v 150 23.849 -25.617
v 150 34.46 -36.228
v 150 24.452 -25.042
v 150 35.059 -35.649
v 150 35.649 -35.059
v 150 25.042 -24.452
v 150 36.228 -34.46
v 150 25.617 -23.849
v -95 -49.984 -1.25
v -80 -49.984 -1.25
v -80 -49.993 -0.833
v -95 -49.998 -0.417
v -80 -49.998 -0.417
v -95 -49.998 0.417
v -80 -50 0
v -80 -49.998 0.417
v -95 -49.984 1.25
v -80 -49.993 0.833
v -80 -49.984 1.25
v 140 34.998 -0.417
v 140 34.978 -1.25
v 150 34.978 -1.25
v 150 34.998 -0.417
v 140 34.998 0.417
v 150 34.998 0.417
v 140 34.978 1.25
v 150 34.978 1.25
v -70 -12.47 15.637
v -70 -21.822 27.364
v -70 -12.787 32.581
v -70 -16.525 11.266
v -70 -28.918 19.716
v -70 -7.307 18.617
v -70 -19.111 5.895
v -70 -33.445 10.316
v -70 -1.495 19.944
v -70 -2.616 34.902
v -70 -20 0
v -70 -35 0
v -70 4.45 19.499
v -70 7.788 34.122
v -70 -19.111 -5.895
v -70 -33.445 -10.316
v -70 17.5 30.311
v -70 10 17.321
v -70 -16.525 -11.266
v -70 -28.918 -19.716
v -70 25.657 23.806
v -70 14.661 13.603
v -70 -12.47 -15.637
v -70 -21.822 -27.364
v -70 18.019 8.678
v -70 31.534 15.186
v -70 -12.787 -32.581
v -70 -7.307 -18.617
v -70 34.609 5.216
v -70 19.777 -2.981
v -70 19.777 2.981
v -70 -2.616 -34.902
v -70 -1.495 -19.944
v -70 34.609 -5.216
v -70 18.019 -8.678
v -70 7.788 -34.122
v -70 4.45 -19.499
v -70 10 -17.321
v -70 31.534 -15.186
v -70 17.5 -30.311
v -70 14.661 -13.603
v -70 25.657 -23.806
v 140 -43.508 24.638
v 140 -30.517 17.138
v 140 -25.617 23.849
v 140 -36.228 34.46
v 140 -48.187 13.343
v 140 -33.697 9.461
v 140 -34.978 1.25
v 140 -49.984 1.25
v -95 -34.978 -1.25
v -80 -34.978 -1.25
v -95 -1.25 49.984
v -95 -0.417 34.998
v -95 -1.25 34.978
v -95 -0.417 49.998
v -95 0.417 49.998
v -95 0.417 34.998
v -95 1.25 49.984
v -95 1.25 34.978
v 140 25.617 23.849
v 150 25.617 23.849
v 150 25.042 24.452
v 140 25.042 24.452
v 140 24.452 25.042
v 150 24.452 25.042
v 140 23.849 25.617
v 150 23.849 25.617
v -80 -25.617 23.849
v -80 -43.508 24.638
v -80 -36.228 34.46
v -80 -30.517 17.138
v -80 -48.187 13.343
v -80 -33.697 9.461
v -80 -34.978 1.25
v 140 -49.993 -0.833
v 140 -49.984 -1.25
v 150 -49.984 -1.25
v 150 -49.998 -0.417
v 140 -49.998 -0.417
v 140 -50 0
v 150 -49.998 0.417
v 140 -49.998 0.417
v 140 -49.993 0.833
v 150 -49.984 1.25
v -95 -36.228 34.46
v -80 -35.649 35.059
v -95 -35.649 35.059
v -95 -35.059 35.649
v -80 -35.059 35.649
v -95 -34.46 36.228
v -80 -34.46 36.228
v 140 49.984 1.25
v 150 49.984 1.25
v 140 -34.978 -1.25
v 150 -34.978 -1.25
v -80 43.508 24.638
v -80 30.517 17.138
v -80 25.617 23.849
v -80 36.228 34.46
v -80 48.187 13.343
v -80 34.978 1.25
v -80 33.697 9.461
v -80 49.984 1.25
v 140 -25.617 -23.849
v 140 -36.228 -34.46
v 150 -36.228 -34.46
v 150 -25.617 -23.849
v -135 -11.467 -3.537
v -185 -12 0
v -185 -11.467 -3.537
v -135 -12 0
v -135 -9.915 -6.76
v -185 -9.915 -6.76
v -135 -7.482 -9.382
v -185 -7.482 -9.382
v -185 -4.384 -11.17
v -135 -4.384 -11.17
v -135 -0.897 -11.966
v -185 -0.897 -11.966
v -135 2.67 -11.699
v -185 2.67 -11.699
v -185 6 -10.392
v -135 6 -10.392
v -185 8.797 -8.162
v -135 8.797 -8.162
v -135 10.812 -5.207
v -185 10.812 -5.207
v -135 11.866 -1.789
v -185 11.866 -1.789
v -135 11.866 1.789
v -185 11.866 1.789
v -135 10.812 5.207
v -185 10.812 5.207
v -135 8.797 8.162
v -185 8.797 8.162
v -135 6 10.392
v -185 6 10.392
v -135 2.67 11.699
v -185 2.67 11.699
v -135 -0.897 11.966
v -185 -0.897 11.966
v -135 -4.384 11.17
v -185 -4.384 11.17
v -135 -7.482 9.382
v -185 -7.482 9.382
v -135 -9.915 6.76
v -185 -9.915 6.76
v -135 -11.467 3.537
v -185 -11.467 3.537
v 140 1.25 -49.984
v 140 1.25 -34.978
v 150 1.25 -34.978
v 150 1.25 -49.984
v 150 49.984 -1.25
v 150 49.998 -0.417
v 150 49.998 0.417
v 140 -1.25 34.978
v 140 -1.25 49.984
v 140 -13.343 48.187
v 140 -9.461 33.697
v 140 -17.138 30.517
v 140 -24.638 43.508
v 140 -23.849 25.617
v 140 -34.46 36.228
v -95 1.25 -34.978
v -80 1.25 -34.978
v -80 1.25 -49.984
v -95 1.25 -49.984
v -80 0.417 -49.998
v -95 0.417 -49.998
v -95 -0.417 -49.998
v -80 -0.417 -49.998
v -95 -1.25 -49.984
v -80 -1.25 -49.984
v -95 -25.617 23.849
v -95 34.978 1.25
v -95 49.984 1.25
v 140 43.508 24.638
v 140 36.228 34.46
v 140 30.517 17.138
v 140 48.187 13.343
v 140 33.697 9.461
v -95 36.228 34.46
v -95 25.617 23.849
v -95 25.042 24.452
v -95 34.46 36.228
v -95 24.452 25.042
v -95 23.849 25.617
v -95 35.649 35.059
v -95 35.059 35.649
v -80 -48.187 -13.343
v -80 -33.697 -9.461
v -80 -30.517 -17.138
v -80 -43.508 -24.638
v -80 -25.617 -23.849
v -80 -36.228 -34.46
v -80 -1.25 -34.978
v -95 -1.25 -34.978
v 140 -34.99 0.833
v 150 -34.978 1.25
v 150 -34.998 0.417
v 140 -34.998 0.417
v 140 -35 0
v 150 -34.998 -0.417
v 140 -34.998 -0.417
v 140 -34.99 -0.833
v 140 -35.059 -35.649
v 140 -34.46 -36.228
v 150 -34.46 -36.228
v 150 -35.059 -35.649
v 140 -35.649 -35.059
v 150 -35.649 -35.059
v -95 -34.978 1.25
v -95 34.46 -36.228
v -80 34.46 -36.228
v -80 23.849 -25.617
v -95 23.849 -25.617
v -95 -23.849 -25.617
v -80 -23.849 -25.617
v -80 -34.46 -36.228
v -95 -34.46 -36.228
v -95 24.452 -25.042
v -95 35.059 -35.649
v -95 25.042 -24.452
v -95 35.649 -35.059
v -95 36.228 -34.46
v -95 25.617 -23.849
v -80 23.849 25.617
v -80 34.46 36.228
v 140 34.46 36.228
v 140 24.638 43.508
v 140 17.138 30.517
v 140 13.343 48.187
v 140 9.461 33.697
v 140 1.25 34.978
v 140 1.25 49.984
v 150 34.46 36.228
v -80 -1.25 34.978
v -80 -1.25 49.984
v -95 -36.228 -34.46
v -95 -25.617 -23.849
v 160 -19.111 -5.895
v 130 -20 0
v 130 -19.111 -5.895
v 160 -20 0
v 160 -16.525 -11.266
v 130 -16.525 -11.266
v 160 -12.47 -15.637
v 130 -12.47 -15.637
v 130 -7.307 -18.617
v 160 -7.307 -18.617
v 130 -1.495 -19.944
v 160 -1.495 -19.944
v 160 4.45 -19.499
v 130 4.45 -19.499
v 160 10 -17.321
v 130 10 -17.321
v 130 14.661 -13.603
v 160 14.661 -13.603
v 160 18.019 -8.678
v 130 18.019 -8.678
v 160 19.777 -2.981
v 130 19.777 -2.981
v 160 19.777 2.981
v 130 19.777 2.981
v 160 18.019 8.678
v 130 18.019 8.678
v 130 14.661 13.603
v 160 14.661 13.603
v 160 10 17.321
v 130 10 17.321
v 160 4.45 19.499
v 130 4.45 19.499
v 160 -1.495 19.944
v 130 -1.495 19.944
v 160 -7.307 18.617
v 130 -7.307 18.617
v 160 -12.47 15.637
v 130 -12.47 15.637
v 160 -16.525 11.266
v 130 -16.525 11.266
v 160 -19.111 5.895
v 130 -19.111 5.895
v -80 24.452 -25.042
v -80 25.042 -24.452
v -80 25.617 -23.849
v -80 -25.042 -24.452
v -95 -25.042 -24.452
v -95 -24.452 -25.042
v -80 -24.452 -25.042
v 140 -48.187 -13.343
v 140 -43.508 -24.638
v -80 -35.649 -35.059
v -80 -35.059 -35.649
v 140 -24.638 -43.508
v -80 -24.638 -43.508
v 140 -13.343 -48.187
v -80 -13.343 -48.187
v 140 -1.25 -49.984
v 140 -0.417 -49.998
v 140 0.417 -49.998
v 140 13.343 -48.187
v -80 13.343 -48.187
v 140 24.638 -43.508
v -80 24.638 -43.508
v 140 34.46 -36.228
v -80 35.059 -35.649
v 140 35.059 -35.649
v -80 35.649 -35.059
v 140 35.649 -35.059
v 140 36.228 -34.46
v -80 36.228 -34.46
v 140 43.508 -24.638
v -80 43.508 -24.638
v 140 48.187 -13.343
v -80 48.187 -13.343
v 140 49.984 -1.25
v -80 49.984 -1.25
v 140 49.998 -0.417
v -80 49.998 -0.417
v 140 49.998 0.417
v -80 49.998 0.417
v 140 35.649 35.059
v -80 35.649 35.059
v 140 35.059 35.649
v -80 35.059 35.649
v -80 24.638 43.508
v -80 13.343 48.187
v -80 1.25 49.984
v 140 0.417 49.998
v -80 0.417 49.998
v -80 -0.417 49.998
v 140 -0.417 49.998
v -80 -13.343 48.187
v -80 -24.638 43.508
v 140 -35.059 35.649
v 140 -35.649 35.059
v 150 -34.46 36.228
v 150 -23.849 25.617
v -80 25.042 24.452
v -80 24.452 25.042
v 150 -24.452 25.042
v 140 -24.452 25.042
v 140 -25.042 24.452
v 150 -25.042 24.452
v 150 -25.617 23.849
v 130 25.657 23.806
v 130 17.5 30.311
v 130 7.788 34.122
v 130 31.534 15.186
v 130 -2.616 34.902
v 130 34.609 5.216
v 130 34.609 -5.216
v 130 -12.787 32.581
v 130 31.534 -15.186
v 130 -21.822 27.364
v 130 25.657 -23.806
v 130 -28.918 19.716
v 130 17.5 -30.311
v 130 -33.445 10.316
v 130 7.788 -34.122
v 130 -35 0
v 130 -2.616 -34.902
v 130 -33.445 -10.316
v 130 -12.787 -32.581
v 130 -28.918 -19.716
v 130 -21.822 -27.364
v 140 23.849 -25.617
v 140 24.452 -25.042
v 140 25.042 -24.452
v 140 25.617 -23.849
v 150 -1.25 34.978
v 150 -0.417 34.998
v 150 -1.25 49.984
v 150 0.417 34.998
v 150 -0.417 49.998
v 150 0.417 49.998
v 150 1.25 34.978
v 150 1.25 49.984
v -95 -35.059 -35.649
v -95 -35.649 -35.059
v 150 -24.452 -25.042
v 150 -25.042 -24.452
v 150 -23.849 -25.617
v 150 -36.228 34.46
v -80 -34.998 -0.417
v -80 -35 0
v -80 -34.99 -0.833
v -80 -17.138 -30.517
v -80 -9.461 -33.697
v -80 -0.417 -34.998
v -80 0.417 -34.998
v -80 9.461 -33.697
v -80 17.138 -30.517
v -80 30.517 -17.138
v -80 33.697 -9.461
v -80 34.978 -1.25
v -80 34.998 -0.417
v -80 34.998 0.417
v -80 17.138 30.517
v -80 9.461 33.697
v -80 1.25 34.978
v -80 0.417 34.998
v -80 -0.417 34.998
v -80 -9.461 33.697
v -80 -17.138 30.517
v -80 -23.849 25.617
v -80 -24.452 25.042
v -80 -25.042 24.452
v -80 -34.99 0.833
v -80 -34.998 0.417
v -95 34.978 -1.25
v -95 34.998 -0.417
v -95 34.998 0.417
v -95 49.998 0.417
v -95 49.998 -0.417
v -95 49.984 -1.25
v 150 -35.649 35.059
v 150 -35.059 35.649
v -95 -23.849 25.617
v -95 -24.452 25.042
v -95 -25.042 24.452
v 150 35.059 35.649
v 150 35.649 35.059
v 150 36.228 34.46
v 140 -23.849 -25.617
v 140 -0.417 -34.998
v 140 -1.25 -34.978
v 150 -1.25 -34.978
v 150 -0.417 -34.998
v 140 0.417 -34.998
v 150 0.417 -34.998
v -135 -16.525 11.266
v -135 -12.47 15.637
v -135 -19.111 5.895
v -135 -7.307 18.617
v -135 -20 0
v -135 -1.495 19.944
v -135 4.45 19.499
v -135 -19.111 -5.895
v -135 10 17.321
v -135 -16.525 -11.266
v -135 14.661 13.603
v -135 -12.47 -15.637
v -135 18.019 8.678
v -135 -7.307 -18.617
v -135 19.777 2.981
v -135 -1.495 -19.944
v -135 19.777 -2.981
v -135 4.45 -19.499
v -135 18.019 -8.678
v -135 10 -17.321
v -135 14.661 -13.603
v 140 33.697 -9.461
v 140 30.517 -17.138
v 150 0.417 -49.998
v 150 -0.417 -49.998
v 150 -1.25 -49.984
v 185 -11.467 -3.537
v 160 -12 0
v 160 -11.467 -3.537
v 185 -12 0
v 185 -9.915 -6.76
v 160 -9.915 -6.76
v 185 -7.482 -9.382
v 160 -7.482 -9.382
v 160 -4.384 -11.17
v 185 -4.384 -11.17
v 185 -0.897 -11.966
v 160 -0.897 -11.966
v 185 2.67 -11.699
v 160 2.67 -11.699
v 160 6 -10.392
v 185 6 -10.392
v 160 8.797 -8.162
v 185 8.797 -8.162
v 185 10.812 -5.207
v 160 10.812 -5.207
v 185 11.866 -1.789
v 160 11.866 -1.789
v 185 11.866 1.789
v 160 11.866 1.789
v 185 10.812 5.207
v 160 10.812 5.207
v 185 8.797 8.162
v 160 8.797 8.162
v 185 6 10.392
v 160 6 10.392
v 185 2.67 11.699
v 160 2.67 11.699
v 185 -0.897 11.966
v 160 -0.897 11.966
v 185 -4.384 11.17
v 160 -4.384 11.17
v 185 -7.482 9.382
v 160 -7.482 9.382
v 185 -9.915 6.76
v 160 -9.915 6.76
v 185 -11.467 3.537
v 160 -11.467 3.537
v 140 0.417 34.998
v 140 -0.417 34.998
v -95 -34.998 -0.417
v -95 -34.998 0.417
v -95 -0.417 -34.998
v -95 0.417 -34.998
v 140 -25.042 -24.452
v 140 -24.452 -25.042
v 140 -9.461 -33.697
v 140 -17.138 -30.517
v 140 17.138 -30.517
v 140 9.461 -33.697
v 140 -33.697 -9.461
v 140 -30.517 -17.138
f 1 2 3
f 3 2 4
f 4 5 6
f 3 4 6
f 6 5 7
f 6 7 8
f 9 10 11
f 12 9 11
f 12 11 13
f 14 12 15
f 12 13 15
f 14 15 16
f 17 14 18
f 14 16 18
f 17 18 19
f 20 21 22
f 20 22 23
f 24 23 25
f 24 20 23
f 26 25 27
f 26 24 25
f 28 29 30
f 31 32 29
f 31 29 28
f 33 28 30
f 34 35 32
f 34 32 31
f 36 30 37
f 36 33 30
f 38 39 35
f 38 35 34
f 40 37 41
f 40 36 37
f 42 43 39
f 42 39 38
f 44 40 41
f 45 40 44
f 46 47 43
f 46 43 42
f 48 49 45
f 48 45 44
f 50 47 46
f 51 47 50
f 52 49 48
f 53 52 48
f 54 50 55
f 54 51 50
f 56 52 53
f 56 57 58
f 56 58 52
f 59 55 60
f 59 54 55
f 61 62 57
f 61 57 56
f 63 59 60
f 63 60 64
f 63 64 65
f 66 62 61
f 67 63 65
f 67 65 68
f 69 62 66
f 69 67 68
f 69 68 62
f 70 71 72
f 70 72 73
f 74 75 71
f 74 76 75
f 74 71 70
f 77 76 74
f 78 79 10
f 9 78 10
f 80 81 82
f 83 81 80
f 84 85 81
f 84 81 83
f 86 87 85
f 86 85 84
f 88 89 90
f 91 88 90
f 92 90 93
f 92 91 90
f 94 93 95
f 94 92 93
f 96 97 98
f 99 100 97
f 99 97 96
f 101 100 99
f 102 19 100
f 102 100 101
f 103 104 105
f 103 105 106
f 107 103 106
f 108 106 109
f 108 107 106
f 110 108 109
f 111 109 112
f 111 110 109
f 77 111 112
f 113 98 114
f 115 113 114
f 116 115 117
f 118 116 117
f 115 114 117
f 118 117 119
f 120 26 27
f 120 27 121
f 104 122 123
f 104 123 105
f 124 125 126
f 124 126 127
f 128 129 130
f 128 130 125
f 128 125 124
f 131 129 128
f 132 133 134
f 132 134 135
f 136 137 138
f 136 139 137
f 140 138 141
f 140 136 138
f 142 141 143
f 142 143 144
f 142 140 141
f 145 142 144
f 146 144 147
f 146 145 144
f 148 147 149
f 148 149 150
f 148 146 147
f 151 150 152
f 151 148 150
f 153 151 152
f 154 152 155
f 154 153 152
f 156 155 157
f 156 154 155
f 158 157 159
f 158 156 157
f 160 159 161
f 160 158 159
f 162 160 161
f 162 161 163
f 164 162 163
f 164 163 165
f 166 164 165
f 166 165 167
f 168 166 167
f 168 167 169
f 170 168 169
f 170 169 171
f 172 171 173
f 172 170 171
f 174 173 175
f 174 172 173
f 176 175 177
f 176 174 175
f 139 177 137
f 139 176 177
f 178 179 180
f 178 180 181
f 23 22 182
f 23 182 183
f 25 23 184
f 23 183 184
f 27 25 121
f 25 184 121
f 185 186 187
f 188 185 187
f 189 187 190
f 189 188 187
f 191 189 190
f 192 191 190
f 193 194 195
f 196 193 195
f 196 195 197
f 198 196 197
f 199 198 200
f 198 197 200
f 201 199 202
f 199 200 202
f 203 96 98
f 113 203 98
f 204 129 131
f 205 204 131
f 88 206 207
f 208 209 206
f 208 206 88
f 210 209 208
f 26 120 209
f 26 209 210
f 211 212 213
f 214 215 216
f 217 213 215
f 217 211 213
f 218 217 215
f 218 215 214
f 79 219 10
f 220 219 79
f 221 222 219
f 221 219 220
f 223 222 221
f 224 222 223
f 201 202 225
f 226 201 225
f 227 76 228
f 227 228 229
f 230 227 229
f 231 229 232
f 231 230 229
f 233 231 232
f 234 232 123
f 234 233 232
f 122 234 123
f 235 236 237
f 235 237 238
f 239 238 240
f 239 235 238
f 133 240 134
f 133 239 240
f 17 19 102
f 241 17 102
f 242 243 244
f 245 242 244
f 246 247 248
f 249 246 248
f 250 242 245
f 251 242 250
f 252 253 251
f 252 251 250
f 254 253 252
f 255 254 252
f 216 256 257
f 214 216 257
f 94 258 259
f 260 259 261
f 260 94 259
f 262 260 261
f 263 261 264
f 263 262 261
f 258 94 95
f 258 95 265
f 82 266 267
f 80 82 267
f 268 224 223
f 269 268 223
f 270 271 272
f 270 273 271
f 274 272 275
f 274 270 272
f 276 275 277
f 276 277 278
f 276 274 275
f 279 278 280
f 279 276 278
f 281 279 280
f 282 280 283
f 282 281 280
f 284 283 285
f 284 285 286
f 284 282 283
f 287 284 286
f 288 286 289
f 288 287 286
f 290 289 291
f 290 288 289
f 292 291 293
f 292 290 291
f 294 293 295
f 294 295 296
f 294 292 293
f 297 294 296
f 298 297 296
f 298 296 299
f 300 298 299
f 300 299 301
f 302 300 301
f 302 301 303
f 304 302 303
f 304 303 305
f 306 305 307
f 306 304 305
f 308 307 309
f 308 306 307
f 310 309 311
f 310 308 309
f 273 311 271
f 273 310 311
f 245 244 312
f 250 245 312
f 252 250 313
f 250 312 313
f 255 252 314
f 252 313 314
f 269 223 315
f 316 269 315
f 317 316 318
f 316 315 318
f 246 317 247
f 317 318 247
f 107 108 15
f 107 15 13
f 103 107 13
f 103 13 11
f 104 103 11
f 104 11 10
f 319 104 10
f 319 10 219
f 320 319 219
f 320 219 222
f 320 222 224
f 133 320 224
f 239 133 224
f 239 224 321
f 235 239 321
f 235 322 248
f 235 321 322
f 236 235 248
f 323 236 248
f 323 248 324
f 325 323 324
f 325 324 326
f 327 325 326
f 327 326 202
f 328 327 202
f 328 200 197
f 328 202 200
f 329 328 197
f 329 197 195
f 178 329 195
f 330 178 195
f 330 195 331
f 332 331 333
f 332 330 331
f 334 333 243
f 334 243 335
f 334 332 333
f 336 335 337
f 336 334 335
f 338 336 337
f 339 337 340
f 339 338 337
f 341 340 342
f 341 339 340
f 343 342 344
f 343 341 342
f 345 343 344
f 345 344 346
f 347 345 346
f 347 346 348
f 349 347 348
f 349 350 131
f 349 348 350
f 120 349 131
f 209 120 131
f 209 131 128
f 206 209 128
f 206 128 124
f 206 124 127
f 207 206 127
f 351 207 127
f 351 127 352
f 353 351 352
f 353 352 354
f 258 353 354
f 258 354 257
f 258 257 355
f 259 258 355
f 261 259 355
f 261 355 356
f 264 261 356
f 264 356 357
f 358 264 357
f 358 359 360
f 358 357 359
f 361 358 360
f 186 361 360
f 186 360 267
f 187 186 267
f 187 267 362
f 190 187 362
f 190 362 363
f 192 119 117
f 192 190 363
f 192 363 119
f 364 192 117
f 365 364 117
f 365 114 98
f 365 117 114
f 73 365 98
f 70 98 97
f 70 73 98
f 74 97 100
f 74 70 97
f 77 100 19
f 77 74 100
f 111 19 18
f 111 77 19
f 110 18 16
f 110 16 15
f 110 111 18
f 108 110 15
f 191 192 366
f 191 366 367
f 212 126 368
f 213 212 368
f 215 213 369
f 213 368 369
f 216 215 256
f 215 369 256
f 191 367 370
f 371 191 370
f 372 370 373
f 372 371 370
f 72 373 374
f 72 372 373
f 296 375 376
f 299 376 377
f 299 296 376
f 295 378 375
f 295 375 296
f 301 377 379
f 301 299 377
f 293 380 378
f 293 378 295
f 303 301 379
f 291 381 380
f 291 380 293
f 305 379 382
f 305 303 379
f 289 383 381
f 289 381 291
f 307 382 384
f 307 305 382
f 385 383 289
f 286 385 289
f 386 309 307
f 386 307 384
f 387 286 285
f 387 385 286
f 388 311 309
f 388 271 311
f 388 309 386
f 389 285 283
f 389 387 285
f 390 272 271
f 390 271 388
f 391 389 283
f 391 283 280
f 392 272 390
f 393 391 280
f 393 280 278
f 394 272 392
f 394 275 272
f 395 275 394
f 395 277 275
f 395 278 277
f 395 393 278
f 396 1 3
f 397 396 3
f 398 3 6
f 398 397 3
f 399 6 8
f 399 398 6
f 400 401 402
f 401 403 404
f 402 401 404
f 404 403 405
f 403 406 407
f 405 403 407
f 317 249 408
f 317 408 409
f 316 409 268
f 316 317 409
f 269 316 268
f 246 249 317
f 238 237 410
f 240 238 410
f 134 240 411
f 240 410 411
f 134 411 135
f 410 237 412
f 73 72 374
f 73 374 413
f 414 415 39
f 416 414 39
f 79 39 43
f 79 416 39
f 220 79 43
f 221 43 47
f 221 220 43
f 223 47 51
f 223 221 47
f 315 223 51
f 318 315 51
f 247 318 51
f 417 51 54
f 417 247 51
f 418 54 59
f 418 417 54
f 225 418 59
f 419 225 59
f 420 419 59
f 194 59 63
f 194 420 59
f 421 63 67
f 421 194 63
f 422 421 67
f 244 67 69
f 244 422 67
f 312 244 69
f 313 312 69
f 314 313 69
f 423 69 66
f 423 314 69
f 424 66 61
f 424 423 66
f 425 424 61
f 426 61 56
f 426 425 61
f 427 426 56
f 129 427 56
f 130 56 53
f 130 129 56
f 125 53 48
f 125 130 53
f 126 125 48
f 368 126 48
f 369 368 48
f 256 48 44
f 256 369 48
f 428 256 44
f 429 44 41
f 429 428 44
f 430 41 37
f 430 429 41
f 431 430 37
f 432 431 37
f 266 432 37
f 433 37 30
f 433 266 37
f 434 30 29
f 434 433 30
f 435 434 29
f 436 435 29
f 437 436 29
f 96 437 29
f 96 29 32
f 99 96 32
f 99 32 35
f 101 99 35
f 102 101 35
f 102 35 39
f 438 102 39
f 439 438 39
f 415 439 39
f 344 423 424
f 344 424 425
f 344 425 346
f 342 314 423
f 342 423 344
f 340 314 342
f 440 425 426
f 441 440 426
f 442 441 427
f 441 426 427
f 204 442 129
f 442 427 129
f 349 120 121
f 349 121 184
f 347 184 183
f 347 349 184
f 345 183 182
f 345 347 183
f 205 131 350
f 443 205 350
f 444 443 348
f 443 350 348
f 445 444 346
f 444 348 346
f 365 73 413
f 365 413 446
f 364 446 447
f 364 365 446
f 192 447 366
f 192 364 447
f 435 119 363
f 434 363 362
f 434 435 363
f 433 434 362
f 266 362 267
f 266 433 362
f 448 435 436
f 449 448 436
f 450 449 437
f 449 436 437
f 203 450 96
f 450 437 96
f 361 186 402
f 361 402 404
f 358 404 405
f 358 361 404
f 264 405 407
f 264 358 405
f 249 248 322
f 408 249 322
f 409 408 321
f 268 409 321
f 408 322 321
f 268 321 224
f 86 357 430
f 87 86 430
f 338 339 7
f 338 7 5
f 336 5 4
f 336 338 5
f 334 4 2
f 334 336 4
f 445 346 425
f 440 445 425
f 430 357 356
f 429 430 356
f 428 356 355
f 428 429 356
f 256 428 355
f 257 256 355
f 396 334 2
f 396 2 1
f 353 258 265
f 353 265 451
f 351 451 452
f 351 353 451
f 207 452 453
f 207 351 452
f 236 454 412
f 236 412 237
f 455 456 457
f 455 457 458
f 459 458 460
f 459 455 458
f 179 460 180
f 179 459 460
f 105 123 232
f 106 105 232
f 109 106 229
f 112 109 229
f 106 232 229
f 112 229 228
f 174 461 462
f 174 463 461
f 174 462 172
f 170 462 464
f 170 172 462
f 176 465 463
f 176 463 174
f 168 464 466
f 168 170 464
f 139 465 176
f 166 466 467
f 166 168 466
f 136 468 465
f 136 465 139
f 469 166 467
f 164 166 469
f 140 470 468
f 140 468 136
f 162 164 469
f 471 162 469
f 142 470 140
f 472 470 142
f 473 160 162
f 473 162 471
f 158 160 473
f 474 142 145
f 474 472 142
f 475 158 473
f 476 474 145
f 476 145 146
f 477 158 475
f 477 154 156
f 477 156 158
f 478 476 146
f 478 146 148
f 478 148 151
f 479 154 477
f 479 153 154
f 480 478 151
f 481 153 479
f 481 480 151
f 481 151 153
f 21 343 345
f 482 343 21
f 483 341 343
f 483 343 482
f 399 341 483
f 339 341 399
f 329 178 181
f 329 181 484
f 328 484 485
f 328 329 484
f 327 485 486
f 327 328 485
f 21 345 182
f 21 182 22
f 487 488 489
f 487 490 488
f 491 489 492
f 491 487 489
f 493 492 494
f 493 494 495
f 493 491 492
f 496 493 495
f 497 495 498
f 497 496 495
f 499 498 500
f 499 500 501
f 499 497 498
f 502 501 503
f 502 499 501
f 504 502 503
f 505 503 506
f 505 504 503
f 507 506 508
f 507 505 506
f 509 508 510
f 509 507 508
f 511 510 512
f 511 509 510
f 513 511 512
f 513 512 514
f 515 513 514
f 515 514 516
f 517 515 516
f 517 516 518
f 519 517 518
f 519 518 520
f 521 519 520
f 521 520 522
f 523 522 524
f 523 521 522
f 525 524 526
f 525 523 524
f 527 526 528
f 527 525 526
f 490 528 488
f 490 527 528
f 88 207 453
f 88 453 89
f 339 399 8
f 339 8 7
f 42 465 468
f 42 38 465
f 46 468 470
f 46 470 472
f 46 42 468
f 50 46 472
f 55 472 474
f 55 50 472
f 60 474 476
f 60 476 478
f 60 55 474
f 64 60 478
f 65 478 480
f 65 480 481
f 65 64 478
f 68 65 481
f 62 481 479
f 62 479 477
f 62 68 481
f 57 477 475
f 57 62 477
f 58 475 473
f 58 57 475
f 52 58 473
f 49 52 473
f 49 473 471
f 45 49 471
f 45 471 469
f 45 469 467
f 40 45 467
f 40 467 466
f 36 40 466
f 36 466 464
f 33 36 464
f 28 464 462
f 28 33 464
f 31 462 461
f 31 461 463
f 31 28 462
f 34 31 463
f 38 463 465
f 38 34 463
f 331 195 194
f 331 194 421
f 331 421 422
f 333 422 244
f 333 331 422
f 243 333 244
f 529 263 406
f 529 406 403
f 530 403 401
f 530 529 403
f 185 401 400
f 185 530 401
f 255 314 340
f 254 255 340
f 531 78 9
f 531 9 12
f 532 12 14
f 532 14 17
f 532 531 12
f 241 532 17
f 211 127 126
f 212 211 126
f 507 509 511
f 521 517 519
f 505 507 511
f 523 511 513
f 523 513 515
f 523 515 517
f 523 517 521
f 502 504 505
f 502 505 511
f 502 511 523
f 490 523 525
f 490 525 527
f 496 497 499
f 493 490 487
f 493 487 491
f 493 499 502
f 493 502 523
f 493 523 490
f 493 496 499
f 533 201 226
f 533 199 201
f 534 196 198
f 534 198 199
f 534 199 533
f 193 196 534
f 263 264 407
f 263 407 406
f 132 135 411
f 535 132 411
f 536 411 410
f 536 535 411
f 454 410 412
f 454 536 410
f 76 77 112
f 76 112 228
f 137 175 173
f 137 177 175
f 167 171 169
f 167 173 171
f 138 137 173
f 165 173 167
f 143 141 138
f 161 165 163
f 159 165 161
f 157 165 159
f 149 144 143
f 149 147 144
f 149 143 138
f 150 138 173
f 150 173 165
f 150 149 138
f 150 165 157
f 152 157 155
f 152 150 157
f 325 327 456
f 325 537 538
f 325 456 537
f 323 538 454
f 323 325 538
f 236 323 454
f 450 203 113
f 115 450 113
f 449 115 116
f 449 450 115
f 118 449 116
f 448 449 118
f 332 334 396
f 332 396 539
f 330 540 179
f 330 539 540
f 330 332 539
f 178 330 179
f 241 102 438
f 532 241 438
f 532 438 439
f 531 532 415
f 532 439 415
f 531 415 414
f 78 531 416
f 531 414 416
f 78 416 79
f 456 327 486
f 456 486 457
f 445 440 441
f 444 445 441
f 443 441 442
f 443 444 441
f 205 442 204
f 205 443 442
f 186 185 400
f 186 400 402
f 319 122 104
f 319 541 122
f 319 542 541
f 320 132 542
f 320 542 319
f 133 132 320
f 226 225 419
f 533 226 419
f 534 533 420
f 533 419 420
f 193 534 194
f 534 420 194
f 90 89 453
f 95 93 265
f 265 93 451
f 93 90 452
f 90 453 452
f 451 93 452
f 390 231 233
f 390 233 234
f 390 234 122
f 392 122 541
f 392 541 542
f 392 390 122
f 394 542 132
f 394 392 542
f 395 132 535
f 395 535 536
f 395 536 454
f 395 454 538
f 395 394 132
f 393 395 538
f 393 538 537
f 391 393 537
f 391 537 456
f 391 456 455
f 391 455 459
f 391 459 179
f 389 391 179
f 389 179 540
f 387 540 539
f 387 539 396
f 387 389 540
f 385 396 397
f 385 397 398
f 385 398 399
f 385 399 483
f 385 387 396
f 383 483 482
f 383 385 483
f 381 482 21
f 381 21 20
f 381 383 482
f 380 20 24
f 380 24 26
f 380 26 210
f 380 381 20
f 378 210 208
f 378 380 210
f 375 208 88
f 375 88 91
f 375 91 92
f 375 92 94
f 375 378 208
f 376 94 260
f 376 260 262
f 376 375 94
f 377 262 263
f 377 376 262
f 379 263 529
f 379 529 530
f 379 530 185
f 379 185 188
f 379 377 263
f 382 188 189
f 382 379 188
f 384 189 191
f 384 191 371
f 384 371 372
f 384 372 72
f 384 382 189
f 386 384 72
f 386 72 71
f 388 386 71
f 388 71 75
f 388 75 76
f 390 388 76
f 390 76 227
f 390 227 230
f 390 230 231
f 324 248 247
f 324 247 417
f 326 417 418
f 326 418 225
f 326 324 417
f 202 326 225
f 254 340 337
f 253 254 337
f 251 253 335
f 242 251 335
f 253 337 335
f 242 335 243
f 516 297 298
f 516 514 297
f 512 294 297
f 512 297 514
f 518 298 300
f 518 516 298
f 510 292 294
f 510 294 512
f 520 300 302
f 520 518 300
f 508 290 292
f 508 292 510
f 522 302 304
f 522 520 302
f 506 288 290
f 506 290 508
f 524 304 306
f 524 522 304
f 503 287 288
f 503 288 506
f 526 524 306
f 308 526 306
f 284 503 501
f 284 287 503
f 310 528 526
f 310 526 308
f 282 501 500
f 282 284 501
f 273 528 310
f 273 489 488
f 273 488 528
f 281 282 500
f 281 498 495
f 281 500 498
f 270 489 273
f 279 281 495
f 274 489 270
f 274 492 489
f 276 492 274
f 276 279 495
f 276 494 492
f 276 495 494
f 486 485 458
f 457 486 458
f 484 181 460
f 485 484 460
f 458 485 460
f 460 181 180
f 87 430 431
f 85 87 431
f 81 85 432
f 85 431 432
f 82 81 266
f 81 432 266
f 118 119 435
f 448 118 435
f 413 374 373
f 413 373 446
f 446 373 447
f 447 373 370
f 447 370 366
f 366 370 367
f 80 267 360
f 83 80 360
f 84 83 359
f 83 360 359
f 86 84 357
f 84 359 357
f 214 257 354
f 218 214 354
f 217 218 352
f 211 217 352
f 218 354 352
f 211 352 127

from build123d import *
from build123d.topology import SkipClean

# Parameters (mm, degrees)
BOSS_EXTRUDE1_DEPTH = 15
BOSS_EXTRUDE2_START = -220
BOSS_EXTRUDE2_DEPTH = 10


with BuildPart() as part:
    # Sketch1 → Revolve2 (revolve)
    with BuildSketch(Plane.XY, mode=Mode.PRIVATE) as revolve2_sk:
        Polygon((-185, 0), (-185, 12), (-135, 12), (-135, 20), (-70, 20), (-70, 35), (-80, 35), (-80, 50), (140, 50), (140, 35), (130, 35), (130, 20), (160, 20), (160, 12), (185, 12), (185, 0), align=None)
    revolve(revolve2_sk.sketch.rotate(Axis((-185, 0, 0), (1, 0, 0)), 180), axis=Axis((-185, 0, 0), (1, 0, 0)))

    # Sketch4 → Boss-Extrude1 (add)
    with SkipClean():  # the faces are left unmerged after this step: merging them gives an invalid solid
        with BuildSketch(Plane.ZY.offset(80)):
            with BuildLine():
                Line((-1.25, 49.984372558), (-1.25, 34.977671449))
                ThreePointArc((-1.25, 34.977671449), (0, 35), (1.25, 34.977671449))
                Line((1.25, 34.977671449), (1.25, 49.984372558))
                ThreePointArc((1.25, 49.984372558), (0, 50), (-1.25, 49.984372558))
            make_face()
            with BuildLine():
                Line((34.460405313, 36.228172265), (23.849065195, 25.616832148))
                ThreePointArc((23.849065195, 25.616832148), (24.748737342, 24.748737342), (25.616832148, 23.849065195))
                Line((25.616832148, 23.849065195), (36.228172265, 34.460405313))
                ThreePointArc((36.228172265, 34.460405313), (35.355339059, 35.355339059), (34.460405313, 36.228172265))
            make_face()
            with BuildLine():
                Line((49.984372558, 1.25), (34.977671449, 1.25))
                ThreePointArc((34.977671449, 1.25), (35, 0), (34.977671449, -1.25))
                Line((34.977671449, -1.25), (49.984372558, -1.25))
                ThreePointArc((49.984372558, -1.25), (50, 0), (49.984372558, 1.25))
            make_face()
            with BuildLine():
                Line((36.228172265, -34.460405313), (25.616832148, -23.849065195))
                ThreePointArc((25.616832148, -23.849065195), (24.748737342, -24.748737342), (23.849065195, -25.616832148))
                Line((23.849065195, -25.616832148), (34.460405313, -36.228172265))
                ThreePointArc((34.460405313, -36.228172265), (35.355339059, -35.355339059), (36.228172265, -34.460405313))
            make_face()
            with BuildLine():
                Line((1.25, -49.984372558), (1.25, -34.977671449))
                ThreePointArc((1.25, -34.977671449), (0, -35), (-1.25, -34.977671449))
                Line((-1.25, -34.977671449), (-1.25, -49.984372558))
                ThreePointArc((-1.25, -49.984372558), (0, -50), (1.25, -49.984372558))
            make_face()
            with BuildLine():
                Line((-34.460405313, -36.228172265), (-23.849065195, -25.616832148))
                ThreePointArc((-23.849065195, -25.616832148), (-24.748737342, -24.748737342), (-25.616832148, -23.849065195))
                Line((-25.616832148, -23.849065195), (-36.228172265, -34.460405313))
                ThreePointArc((-36.228172265, -34.460405313), (-35.355339059, -35.355339059), (-34.460405313, -36.228172265))
            make_face()
            with BuildLine():
                Line((-49.984372558, -1.25), (-34.977671449, -1.25))
                ThreePointArc((-34.977671449, -1.25), (-35, 0), (-34.977671449, 1.25))
                Line((-34.977671449, 1.25), (-49.984372558, 1.25))
                ThreePointArc((-49.984372558, 1.25), (-50, 0), (-49.984372558, -1.25))
            make_face()
            with BuildLine():
                Line((-36.228172265, 34.460405313), (-25.616832148, 23.849065195))
                ThreePointArc((-25.616832148, 23.849065195), (-24.748737342, 24.748737342), (-23.849065195, 25.616832148))
                Line((-23.849065195, 25.616832148), (-34.460405313, 36.228172265))
                ThreePointArc((-34.460405313, 36.228172265), (-35.355339059, 35.355339059), (-36.228172265, 34.460405313))
            make_face()
        extrude(amount=BOSS_EXTRUDE1_DEPTH)

    # Sketch4_2 → Boss-Extrude2 (add)
    with SkipClean():  # the faces are left unmerged after this step: merging them gives an invalid solid
        with BuildSketch(Plane.ZY.offset(80).offset(BOSS_EXTRUDE2_START)):
            with BuildLine():
                ThreePointArc((1.25, 49.984372558), (0, 50), (-1.25, 49.984372558))
                Line((-1.25, 49.984372558), (-1.25, 34.977671449))
                ThreePointArc((-1.25, 34.977671449), (0, 35), (1.25, 34.977671449))
                Line((1.25, 34.977671449), (1.25, 49.984372558))
            make_face()
            with BuildLine():
                Line((-23.849065195, 25.616832148), (-34.460405313, 36.228172265))
                ThreePointArc((-34.460405313, 36.228172265), (-35.355339059, 35.355339059), (-36.228172265, 34.460405313))
                Line((-36.228172265, 34.460405313), (-25.616832148, 23.849065195))
                ThreePointArc((-25.616832148, 23.849065195), (-24.748737342, 24.748737342), (-23.849065195, 25.616832148))
            make_face()
            with BuildLine():
                ThreePointArc((36.228172265, 34.460405313), (35.355339059, 35.355339059), (34.460405313, 36.228172265))
                Line((34.460405313, 36.228172265), (23.849065195, 25.616832148))
                ThreePointArc((23.849065195, 25.616832148), (24.748737342, 24.748737342), (25.616832148, 23.849065195))
                Line((25.616832148, 23.849065195), (36.228172265, 34.460405313))
            make_face()
            with BuildLine():
                Line((-34.977671449, 1.25), (-49.984372558, 1.25))
                ThreePointArc((-49.984372558, 1.25), (-50, 0), (-49.984372558, -1.25))
                Line((-49.984372558, -1.25), (-34.977671449, -1.25))
                ThreePointArc((-34.977671449, -1.25), (-35, 0), (-34.977671449, 1.25))
            make_face()
            with BuildLine():
                ThreePointArc((49.984372558, -1.25), (50, 0), (49.984372558, 1.25))
                Line((49.984372558, 1.25), (34.977671449, 1.25))
                ThreePointArc((34.977671449, 1.25), (35, 0), (34.977671449, -1.25))
                Line((34.977671449, -1.25), (49.984372558, -1.25))
            make_face()
            with BuildLine():
                Line((-25.616832148, -23.849065195), (-36.228172265, -34.460405313))
                ThreePointArc((-36.228172265, -34.460405313), (-35.355339059, -35.355339059), (-34.460405313, -36.228172265))
                Line((-34.460405313, -36.228172265), (-23.849065195, -25.616832148))
                ThreePointArc((-23.849065195, -25.616832148), (-24.748737342, -24.748737342), (-25.616832148, -23.849065195))
            make_face()
            with BuildLine():
                ThreePointArc((34.460405313, -36.228172265), (35.355339059, -35.355339059), (36.228172265, -34.460405313))
                Line((36.228172265, -34.460405313), (25.616832148, -23.849065195))
                ThreePointArc((25.616832148, -23.849065195), (24.748737342, -24.748737342), (23.849065195, -25.616832148))
                Line((23.849065195, -25.616832148), (34.460405313, -36.228172265))
            make_face()
            with BuildLine():
                Line((-1.25, -34.977671449), (-1.25, -49.984372558))
                ThreePointArc((-1.25, -49.984372558), (0, -50), (1.25, -49.984372558))
                Line((1.25, -49.984372558), (1.25, -34.977671449))
                ThreePointArc((1.25, -34.977671449), (0, -35), (-1.25, -34.977671449))
            make_face()
        extrude(amount=-BOSS_EXTRUDE2_DEPTH)


solid = part.part
